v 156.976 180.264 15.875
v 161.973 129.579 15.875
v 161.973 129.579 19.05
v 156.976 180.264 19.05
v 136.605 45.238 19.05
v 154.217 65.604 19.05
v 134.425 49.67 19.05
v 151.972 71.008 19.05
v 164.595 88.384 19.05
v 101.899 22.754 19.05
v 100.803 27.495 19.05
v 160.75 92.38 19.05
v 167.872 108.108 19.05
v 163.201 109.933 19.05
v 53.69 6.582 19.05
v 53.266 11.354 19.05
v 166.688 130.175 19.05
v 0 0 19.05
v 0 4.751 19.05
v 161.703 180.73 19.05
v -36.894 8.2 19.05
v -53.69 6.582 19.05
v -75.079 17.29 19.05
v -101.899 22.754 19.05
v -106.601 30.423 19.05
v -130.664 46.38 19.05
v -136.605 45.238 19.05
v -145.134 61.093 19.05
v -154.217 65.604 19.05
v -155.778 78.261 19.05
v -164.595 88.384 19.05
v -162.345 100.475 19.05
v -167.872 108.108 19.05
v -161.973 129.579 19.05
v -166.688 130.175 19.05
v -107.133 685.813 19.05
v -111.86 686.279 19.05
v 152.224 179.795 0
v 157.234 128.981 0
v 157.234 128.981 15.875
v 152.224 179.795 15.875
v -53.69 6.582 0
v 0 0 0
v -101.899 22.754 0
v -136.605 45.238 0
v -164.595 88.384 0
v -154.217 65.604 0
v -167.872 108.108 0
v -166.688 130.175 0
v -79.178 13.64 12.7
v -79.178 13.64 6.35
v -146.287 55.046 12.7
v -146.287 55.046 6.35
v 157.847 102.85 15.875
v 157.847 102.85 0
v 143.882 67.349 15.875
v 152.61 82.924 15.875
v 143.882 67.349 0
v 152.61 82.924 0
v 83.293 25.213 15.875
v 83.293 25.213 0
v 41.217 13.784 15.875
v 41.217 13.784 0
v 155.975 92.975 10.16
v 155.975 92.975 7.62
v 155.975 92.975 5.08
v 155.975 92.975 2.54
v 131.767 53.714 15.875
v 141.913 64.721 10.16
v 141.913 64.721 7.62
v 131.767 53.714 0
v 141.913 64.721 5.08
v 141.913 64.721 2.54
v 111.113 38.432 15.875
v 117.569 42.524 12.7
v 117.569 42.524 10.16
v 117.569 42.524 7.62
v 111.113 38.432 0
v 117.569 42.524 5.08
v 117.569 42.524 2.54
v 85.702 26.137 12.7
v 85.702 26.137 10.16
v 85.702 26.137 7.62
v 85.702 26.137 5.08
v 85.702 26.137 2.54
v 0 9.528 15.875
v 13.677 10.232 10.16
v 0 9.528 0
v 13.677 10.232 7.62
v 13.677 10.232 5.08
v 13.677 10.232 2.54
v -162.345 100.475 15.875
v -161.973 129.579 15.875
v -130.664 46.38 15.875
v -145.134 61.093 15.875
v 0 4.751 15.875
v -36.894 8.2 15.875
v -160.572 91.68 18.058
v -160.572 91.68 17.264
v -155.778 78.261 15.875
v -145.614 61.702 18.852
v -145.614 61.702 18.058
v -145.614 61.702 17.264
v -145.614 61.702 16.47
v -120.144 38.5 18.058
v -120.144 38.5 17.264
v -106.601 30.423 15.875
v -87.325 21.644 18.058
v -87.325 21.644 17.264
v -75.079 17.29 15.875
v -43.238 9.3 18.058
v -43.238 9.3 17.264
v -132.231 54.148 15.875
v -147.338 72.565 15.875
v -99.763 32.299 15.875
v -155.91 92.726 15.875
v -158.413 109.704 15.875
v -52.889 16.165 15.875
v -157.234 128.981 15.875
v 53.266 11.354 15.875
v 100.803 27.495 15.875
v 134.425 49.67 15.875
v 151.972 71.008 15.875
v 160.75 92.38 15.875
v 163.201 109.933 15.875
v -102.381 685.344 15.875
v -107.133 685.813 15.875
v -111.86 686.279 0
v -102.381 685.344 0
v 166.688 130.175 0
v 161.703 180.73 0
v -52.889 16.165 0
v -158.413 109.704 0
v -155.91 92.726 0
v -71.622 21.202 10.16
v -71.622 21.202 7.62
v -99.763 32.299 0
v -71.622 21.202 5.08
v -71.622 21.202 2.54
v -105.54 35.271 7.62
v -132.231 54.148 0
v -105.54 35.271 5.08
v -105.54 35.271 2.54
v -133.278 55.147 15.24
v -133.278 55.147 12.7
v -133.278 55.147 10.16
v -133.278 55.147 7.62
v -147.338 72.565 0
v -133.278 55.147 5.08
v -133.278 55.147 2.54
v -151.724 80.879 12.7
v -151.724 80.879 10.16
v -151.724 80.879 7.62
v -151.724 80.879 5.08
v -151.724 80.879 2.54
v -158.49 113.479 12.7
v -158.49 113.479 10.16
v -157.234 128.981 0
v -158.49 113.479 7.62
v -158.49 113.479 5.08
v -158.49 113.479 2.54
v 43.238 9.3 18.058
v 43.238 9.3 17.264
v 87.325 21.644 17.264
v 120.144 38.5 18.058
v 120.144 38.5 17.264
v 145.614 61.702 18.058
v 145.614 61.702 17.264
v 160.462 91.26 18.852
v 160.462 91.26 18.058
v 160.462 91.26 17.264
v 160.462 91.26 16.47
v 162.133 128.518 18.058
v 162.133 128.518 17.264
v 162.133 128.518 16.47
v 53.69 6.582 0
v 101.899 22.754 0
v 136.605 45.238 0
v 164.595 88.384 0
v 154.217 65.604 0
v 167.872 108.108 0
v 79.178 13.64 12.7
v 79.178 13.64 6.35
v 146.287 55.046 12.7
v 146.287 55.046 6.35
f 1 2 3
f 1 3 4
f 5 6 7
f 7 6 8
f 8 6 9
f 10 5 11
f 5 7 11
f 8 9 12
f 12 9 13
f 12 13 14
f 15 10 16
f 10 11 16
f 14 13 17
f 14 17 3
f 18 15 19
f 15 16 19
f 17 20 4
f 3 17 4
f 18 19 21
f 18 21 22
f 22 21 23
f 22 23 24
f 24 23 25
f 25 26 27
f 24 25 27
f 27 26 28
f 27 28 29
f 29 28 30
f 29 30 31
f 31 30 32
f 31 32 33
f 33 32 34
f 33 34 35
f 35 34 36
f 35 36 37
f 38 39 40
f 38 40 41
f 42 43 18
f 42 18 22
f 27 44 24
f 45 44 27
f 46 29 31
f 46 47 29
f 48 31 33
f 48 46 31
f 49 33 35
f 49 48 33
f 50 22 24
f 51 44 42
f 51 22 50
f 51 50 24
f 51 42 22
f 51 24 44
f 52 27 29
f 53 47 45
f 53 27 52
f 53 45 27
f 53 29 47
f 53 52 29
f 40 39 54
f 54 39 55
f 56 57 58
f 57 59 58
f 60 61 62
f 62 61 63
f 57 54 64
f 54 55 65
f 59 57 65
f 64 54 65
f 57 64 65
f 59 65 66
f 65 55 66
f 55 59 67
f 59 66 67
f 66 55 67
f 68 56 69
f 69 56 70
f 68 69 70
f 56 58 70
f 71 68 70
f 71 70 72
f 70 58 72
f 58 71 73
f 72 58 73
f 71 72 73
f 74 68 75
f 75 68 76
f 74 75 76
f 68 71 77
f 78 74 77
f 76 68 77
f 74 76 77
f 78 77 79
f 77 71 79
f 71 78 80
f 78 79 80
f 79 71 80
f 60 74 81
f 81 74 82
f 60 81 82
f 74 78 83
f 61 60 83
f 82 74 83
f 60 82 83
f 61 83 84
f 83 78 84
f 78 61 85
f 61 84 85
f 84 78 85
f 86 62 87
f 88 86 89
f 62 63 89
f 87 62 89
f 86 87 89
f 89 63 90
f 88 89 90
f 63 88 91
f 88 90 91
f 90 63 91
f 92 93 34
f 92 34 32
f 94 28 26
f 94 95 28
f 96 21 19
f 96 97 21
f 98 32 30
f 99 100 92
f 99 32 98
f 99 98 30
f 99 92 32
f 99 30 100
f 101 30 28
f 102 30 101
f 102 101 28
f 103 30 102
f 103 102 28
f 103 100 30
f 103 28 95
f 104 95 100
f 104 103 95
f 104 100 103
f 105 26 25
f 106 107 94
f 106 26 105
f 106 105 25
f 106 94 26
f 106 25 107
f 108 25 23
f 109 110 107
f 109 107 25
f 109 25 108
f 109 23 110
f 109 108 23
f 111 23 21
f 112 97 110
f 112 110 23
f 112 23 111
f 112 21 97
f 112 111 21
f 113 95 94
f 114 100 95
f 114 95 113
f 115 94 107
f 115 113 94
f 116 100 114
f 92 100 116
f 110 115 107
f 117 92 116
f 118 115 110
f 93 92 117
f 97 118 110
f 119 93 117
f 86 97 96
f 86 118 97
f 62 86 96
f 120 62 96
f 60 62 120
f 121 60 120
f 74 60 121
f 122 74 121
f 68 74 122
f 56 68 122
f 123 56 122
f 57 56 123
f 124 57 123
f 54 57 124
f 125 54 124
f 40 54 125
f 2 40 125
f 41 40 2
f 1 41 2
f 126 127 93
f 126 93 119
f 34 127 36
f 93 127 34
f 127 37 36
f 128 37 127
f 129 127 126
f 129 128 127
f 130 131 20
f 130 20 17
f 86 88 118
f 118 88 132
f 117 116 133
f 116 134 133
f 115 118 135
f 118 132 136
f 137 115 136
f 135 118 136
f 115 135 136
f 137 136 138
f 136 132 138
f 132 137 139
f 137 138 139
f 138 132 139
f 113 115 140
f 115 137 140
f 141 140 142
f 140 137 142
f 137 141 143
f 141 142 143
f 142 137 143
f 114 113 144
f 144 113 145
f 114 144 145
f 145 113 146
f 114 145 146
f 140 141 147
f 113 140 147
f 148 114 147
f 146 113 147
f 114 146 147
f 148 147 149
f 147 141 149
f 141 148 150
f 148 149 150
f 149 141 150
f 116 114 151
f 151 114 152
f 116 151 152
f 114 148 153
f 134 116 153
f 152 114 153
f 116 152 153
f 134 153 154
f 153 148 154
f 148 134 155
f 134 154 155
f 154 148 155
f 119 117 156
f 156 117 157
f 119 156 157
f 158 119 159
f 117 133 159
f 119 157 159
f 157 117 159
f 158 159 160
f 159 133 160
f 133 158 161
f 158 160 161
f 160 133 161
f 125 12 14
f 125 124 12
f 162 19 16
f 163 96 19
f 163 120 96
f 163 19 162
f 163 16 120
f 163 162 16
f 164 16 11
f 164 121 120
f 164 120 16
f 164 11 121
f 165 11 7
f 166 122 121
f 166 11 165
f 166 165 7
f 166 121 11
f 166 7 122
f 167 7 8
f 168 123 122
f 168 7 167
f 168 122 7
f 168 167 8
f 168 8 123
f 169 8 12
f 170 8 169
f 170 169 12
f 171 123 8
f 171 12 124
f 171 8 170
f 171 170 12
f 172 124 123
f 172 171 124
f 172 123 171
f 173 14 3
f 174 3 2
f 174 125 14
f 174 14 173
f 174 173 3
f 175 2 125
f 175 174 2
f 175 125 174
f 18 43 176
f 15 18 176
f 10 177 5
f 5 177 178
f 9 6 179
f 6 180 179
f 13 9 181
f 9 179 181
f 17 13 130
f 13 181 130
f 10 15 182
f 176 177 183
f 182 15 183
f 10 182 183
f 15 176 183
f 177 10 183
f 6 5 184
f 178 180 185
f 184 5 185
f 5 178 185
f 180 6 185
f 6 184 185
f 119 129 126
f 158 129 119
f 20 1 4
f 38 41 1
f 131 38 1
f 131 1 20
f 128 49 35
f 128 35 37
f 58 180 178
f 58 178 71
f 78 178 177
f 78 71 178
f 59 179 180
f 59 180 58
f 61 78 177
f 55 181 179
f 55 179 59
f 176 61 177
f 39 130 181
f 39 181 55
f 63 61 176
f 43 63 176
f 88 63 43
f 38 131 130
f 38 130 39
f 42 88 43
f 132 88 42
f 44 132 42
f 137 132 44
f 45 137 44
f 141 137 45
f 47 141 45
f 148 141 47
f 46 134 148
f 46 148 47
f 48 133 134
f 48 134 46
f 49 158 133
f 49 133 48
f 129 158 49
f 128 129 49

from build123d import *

# Parameters (mm, degrees)
BOSS_EXTRUDE1_DEPTH = 19.05
CUT_EXTRUDE1_START  = -3.175
CUT_EXTRUDE1_DEPTH  = 3.175


# Read off the part's stored shape, not the designer's step: Cut-Extrude1
with BuildPart() as part:
    # Sketch1 → Boss-Extrude1 (new body)
    with BuildSketch(Plane.XY):
        with BuildLine():
            Line((157.234081882, 128.980548454), (152.224173193, 179.795336584))
            Line((152.224173193, 179.795336584), (161.70321507, 180.729890008))
            Line((161.70321507, 180.729890008), (166.6875, 130.175))
            add(Edge.make_bspline(
                [(0, 0), (73.666580622, 1.740675992), (181.188092361, 36.200835609), (166.6875, 130.175)],
                knots=[0, 0, 0, 0, 1, 1, 1, 1], degree=3))
            add(Edge.make_bspline(
                [(0, 0), (-73.666580622, 1.740675992), (-181.188092361, 36.200835609), (-166.6875, 130.175)],
                knots=[0, 0, 0, 0, 1, 1, 1, 1], degree=3))
            Line((-166.6875, 130.175), (-111.860365766, 686.278790089))
            Line((-111.860365766, 686.278790089), (-102.381323889, 685.344236665))
            Line((-102.381323889, 685.344236665), (-157.234081882, 128.980548454))
            add(Edge.make_bspline(
                [(0, 9.52776174), (-1.117611602, 9.555193192), (-3.340472897, 9.624755056), (-7.880039481, 9.827207732), (-13.652210416, 10.198958437), (-20.725459036, 10.840441372), (-30.303235723, 11.962316267), (-42.47749757, 13.875858033), (-57.165232888, 17.02314898), (-71.689613059, 21.050850851), (-90.515854195, 27.626537064), (-112.436111514, 38.157452487), (-130.643933928, 51.803557723), (-142.189146149, 64.564536934), (-149.192253507, 75.075537554), (-153.541361304, 84.674022673), (-156.058613173, 92.923629982), (-157.442658539, 99.418206789), (-158.29640922, 106.242287005), (-158.540175044, 112.221426054), (-158.437150466, 117.190167219), (-158.20642164, 121.010360535), (-157.881730698, 124.277278241), (-157.584058118, 126.601085874), (-157.415798733, 127.781927866), (-157.316566229, 128.446705395), (-157.261207353, 128.804756083), (-157.234081882, 128.980548454)],
                knots=[0.001057036, 0.001057036, 0.001057036, 0.001057036, 0.016679825, 0.032302613, 0.063548191, 0.094793768, 0.126039346, 0.1885305, 0.251021655, 0.31351281, 0.376003965, 0.500986274, 0.625968584, 0.688459739, 0.750950893, 0.813442048, 0.844687626, 0.875933203, 0.90717878, 0.938424358, 0.954047147, 0.969669935, 0.985292724, 0.993104118, 0.997009815, 0.998962664, 1.000915513, 1.000915513, 1.000915513, 1.000915513], degree=3))
            add(Edge.make_bspline(
                [(157.234081882, 128.980548454), (157.261207353, 128.804756083), (157.316566229, 128.446705395), (157.415798733, 127.781927866), (157.584058118, 126.601085874), (157.881730698, 124.277278241), (158.20642164, 121.010360535), (158.437150466, 117.190167219), (158.540175044, 112.221426054), (158.29640922, 106.242287005), (157.442658539, 99.418206789), (156.058613173, 92.923629982), (153.541361304, 84.674022673), (149.192253507, 75.075537554), (142.189146149, 64.564536934), (130.643933928, 51.803557723), (112.436111514, 38.157452487), (90.515854195, 27.626537064), (71.689613059, 21.050850851), (57.165232888, 17.02314898), (42.47749757, 13.875858033), (30.303235723, 11.962316267), (20.725459036, 10.840441372), (13.652210416, 10.198958437), (7.880039481, 9.827207732), (3.340472897, 9.624755056), (1.117611602, 9.555193192), (0, 9.52776174)],
                knots=[0.001057036, 0.001057036, 0.001057036, 0.001057036, 0.003009885, 0.004962733, 0.00886843, 0.016679825, 0.032302613, 0.047925402, 0.063548191, 0.094793768, 0.126039346, 0.157284923, 0.1885305, 0.251021655, 0.31351281, 0.376003965, 0.500986274, 0.625968584, 0.688459739, 0.750950893, 0.813442048, 0.875933203, 0.90717878, 0.938424358, 0.969669935, 0.985292724, 1.000915513, 1.000915513, 1.000915513, 1.000915513], degree=3))
        make_face()
    extrude(amount=BOSS_EXTRUDE1_DEPTH)

    # Cut-Extrude1 outline → Cut-Extrude1 (cut)
    with BuildSketch(Plane.XY.offset(19.05).offset(CUT_EXTRUDE1_START)):
        with BuildLine():
            Line((-107.13348355, 685.812759448), (-161.973395498, 129.579366829))
            add(Edge.make_bspline(
                [(-161.973395498, 129.579366829), (-162.00171525, 129.395834674), (-162.028495082, 129.221667618), (-162.081541528, 128.869683844), (-162.159761136, 128.342436218), (-162.332851825, 127.117281326), (-162.641575692, 124.687275119), (-162.842770083, 122.639027203), (-163.16267738, 118.588121623), (-163.265984358, 115.948323615), (-163.262423556, 108.206156668), (-162.842404671, 103.28119599), (-161.248767489, 93.87057237), (-160.075199693, 89.384607046), (-157.045094148, 80.81595139), (-155.188366146, 76.733021658), (-150.853165213, 68.941465452), (-148.374445898, 65.232835538), (-142.854480948, 58.172008914), (-139.813114246, 54.819957421), (-129.940113205, 45.284353516), (-122.357367523, 39.621644841), (-105.759630554, 29.639229241), (-96.746229237, 25.320471564), (-77.904058281, 17.968013466), (-68.075890669, 14.934086027), (-48.230630184, 10.070216513), (-38.213566045, 8.240058869), (-18.618837768, 5.689359978), (-9.040867048, 4.96882986), (0, 4.751150948)],
                knots=[0, 0, 0, 0, 0.001953125, 0.001953125, 0.00390625, 0.0078125, 0.015625, 0.03125, 0.03125, 0.0625, 0.0625, 0.125, 0.125, 0.1875, 0.1875, 0.25, 0.25, 0.3125, 0.3125, 0.375, 0.375, 0.5, 0.5, 0.625, 0.625, 0.75, 0.75, 0.875, 0.875, 1, 1, 1, 1], degree=3))
            add(Edge.make_bspline(
                [(0, 4.751150948), (9.040867048, 4.96882986), (18.618837768, 5.689359978), (38.213566045, 8.240058869), (48.230630184, 10.070216513), (68.075890669, 14.934086027), (77.904058281, 17.968013466), (96.746229237, 25.320471564), (105.759630554, 29.639229241), (122.357367523, 39.621644841), (129.940113205, 45.284353516), (139.813114246, 54.819957421), (142.854480948, 58.172008914), (148.374445898, 65.232835538), (150.853165213, 68.941465452), (155.188366146, 76.733021658), (157.045094148, 80.81595139), (160.075199693, 89.384607046), (161.248767489, 93.87057237), (162.842404671, 103.28119599), (163.262423556, 108.206156668), (163.265984358, 115.948323615), (163.16267738, 118.588121623), (162.842770083, 122.639027203), (162.708640489, 124.004525814), (162.465162127, 126.075850353), (162.332851825, 127.117281326), (162.159761136, 128.342436218), (162.081541528, 128.869683844), (162.028495082, 129.221667618), (162.00171525, 129.395834674), (161.973395498, 129.579366829)],
                knots=[0, 0, 0, 0, 0.125, 0.125, 0.25, 0.25, 0.375, 0.375, 0.5, 0.5, 0.625, 0.625, 0.6875, 0.6875, 0.75, 0.75, 0.8125, 0.8125, 0.875, 0.875, 0.9375, 0.9375, 0.96875, 0.96875, 0.984375, 0.984375, 0.9921875, 0.99609375, 0.998046875, 0.998046875, 1, 1, 1, 1], degree=3))
            Line((161.973395498, 129.579366829), (156.976332854, 180.263859367))
            Line((156.976332854, 180.263859367), (152.224173193, 179.795336584))
            Line((152.224173193, 179.795336584), (157.234081882, 128.980548454))
            add(Edge.make_bspline(
                [(157.234081882, 128.980548454), (157.261207353, 128.804756083), (157.316566229, 128.446705395), (157.415798733, 127.781927866), (157.584058118, 126.601085874), (157.881730698, 124.277278241), (158.20642164, 121.010360535), (158.437150466, 117.190167219), (158.540175044, 112.221426054), (158.29640922, 106.242287005), (157.442658539, 99.418206789), (156.058613173, 92.923629982), (153.541361304, 84.674022673), (149.192253507, 75.075537554), (142.189146149, 64.564536934), (130.643933928, 51.803557723), (112.436111514, 38.157452487), (90.515854195, 27.626537064), (71.689613059, 21.050850851), (57.165232888, 17.02314898), (42.47749757, 13.875858033), (30.303235723, 11.962316267), (20.725459036, 10.840441372), (13.652210416, 10.198958437), (7.880039481, 9.827207732), (3.340472897, 9.624755056), (1.117611602, 9.555193192), (0, 9.52776174)],
                knots=[0.001057036, 0.001057036, 0.001057036, 0.001057036, 0.003009885, 0.004962733, 0.00886843, 0.016679825, 0.032302613, 0.047925402, 0.063548191, 0.094793768, 0.126039346, 0.157284923, 0.1885305, 0.251021655, 0.31351281, 0.376003965, 0.500986274, 0.625968584, 0.688459739, 0.750950893, 0.813442048, 0.875933203, 0.90717878, 0.938424358, 0.969669935, 0.985292724, 1.000915513, 1.000915513, 1.000915513, 1.000915513], degree=3))
            add(Edge.make_bspline(
                [(0, 9.52776174), (-1.117611602, 9.555193192), (-3.340472897, 9.624755056), (-7.880039481, 9.827207732), (-13.652210416, 10.198958437), (-20.725459036, 10.840441372), (-30.303235723, 11.962316267), (-42.47749757, 13.875858033), (-57.165232888, 17.02314898), (-71.689613059, 21.050850851), (-90.515854195, 27.626537064), (-112.436111514, 38.157452487), (-130.643933928, 51.803557723), (-142.189146149, 64.564536934), (-149.192253507, 75.075537554), (-153.541361304, 84.674022673), (-156.058613173, 92.923629982), (-157.442658539, 99.418206789), (-158.29640922, 106.242287005), (-158.540175044, 112.221426054), (-158.437150466, 117.190167219), (-158.20642164, 121.010360535), (-157.881730698, 124.277278241), (-157.584058118, 126.601085874), (-157.415798733, 127.781927866), (-157.316566229, 128.446705395), (-157.261207353, 128.804756083), (-157.234081882, 128.980548454)],
                knots=[0.001057036, 0.001057036, 0.001057036, 0.001057036, 0.016679825, 0.032302613, 0.063548191, 0.094793768, 0.126039346, 0.1885305, 0.251021655, 0.31351281, 0.376003965, 0.500986274, 0.625968584, 0.688459739, 0.750950893, 0.813442048, 0.844687626, 0.875933203, 0.90717878, 0.938424358, 0.954047147, 0.969669935, 0.985292724, 0.993104118, 0.997009815, 0.998962664, 1.000915513, 1.000915513, 1.000915513, 1.000915513], degree=3))
            Line((-157.234081882, 128.980548454), (-102.381323889, 685.344236665))
            Line((-102.381323889, 685.344236665), (-107.13348355, 685.812759448))
        make_face()
    extrude(amount=CUT_EXTRUDE1_DEPTH, mode=Mode.SUBTRACT)


solid = part.part
